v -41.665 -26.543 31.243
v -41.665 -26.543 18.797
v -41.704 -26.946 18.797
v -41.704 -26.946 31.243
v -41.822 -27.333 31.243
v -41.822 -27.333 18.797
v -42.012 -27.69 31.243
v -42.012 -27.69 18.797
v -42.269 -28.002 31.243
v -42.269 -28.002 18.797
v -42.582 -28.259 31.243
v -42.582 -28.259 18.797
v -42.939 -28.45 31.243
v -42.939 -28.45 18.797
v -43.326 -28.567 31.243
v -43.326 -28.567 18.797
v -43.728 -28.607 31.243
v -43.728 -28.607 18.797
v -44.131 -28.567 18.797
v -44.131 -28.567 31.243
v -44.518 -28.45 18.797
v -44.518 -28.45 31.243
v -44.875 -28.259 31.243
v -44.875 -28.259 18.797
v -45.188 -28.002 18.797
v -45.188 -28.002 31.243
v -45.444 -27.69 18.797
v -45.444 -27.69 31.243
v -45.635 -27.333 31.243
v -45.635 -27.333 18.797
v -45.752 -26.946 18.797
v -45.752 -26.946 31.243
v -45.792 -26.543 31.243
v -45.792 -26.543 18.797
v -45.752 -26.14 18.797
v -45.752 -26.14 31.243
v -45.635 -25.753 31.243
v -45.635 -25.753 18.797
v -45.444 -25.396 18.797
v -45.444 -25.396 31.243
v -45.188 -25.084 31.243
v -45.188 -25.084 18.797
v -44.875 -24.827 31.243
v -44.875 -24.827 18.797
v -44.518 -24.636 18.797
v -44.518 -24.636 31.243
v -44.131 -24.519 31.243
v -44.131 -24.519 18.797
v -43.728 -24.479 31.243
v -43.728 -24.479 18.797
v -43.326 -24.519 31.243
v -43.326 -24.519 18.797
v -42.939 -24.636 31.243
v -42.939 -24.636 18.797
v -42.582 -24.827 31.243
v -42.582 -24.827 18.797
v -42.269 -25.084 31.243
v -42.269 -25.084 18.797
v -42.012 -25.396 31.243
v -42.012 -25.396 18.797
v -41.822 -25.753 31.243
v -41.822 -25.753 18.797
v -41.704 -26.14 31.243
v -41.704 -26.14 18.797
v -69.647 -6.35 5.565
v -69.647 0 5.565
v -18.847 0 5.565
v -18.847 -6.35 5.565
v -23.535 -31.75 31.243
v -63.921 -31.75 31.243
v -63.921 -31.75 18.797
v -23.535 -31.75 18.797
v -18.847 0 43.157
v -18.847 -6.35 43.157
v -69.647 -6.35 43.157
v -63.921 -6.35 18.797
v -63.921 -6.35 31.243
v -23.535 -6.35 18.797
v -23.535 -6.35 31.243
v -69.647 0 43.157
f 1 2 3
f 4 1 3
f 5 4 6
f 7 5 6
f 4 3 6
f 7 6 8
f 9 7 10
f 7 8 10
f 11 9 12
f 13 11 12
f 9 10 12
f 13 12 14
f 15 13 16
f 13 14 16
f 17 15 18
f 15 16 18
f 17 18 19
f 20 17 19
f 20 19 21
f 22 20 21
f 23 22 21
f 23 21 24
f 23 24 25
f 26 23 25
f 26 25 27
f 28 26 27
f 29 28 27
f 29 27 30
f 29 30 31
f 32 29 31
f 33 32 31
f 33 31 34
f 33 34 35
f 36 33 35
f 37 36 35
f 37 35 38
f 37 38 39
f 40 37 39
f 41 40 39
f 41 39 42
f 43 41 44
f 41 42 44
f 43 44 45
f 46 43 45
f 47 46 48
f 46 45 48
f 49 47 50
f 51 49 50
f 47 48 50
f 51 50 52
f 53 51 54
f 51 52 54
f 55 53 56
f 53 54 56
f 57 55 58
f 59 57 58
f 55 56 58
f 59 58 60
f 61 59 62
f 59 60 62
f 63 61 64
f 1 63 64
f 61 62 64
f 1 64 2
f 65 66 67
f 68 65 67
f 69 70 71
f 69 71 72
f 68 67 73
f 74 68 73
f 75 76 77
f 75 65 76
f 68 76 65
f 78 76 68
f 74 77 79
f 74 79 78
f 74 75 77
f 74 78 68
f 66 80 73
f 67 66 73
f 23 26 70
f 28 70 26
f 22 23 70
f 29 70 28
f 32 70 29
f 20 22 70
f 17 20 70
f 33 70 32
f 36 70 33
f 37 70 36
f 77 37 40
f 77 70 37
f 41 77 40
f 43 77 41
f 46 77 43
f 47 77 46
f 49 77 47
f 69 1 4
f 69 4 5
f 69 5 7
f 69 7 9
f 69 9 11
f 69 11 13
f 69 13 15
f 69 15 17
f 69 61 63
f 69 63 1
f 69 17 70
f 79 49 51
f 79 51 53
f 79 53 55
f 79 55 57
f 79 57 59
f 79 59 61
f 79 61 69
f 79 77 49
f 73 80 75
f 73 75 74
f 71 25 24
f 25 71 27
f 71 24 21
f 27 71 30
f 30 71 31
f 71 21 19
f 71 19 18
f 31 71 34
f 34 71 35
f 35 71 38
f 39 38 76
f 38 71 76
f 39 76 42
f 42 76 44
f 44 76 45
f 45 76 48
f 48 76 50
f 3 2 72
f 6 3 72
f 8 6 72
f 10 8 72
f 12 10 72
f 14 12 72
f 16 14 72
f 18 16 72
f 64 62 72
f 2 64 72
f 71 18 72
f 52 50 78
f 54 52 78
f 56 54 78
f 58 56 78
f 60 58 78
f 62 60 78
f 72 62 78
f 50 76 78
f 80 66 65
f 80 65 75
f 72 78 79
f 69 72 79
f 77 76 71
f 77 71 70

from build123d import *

# Parameters (mm, degrees)
F0_W     = 40.386
F0_H     = 12.446
F1_DEPTH = 31.75
F0_W_2   = 50.8
F0_H_2   = 37.592
F2_DEPTH = 6.35
F3_R     = 2.06375
F4_DEPTH = 62.67391


with BuildPart() as f1:
    # F0 (on Front) → F1 (new body)
    with BuildSketch(Plane.XZ):
        with Locations((-43.728333, 25.020055)):
            Rectangle(F0_W, F0_H)
    extrude(amount=F1_DEPTH)

    # F0 (on Front) → F2 (join)
    with BuildSketch(Plane.XZ):
        with Locations((-44.247495, 24.36066)):
            Rectangle(F0_W_2, F0_H_2)
        with Locations((-43.728333, 25.020055)):
            Rectangle(F0_W, F0_H, mode=Mode.SUBTRACT)
    extrude(amount=F2_DEPTH)

    # F3 (on face) → F4 (cut)
    with BuildSketch(Plane(origin=(0, 0, 18.797055), x_dir=(1, 0, 0), z_dir=(0, 0, -1))):
        with Locations((-43.728333, 26.543)):
            Circle(F3_R)
    extrude(amount=-F4_DEPTH, mode=Mode.SUBTRACT)


solid = f1.part
